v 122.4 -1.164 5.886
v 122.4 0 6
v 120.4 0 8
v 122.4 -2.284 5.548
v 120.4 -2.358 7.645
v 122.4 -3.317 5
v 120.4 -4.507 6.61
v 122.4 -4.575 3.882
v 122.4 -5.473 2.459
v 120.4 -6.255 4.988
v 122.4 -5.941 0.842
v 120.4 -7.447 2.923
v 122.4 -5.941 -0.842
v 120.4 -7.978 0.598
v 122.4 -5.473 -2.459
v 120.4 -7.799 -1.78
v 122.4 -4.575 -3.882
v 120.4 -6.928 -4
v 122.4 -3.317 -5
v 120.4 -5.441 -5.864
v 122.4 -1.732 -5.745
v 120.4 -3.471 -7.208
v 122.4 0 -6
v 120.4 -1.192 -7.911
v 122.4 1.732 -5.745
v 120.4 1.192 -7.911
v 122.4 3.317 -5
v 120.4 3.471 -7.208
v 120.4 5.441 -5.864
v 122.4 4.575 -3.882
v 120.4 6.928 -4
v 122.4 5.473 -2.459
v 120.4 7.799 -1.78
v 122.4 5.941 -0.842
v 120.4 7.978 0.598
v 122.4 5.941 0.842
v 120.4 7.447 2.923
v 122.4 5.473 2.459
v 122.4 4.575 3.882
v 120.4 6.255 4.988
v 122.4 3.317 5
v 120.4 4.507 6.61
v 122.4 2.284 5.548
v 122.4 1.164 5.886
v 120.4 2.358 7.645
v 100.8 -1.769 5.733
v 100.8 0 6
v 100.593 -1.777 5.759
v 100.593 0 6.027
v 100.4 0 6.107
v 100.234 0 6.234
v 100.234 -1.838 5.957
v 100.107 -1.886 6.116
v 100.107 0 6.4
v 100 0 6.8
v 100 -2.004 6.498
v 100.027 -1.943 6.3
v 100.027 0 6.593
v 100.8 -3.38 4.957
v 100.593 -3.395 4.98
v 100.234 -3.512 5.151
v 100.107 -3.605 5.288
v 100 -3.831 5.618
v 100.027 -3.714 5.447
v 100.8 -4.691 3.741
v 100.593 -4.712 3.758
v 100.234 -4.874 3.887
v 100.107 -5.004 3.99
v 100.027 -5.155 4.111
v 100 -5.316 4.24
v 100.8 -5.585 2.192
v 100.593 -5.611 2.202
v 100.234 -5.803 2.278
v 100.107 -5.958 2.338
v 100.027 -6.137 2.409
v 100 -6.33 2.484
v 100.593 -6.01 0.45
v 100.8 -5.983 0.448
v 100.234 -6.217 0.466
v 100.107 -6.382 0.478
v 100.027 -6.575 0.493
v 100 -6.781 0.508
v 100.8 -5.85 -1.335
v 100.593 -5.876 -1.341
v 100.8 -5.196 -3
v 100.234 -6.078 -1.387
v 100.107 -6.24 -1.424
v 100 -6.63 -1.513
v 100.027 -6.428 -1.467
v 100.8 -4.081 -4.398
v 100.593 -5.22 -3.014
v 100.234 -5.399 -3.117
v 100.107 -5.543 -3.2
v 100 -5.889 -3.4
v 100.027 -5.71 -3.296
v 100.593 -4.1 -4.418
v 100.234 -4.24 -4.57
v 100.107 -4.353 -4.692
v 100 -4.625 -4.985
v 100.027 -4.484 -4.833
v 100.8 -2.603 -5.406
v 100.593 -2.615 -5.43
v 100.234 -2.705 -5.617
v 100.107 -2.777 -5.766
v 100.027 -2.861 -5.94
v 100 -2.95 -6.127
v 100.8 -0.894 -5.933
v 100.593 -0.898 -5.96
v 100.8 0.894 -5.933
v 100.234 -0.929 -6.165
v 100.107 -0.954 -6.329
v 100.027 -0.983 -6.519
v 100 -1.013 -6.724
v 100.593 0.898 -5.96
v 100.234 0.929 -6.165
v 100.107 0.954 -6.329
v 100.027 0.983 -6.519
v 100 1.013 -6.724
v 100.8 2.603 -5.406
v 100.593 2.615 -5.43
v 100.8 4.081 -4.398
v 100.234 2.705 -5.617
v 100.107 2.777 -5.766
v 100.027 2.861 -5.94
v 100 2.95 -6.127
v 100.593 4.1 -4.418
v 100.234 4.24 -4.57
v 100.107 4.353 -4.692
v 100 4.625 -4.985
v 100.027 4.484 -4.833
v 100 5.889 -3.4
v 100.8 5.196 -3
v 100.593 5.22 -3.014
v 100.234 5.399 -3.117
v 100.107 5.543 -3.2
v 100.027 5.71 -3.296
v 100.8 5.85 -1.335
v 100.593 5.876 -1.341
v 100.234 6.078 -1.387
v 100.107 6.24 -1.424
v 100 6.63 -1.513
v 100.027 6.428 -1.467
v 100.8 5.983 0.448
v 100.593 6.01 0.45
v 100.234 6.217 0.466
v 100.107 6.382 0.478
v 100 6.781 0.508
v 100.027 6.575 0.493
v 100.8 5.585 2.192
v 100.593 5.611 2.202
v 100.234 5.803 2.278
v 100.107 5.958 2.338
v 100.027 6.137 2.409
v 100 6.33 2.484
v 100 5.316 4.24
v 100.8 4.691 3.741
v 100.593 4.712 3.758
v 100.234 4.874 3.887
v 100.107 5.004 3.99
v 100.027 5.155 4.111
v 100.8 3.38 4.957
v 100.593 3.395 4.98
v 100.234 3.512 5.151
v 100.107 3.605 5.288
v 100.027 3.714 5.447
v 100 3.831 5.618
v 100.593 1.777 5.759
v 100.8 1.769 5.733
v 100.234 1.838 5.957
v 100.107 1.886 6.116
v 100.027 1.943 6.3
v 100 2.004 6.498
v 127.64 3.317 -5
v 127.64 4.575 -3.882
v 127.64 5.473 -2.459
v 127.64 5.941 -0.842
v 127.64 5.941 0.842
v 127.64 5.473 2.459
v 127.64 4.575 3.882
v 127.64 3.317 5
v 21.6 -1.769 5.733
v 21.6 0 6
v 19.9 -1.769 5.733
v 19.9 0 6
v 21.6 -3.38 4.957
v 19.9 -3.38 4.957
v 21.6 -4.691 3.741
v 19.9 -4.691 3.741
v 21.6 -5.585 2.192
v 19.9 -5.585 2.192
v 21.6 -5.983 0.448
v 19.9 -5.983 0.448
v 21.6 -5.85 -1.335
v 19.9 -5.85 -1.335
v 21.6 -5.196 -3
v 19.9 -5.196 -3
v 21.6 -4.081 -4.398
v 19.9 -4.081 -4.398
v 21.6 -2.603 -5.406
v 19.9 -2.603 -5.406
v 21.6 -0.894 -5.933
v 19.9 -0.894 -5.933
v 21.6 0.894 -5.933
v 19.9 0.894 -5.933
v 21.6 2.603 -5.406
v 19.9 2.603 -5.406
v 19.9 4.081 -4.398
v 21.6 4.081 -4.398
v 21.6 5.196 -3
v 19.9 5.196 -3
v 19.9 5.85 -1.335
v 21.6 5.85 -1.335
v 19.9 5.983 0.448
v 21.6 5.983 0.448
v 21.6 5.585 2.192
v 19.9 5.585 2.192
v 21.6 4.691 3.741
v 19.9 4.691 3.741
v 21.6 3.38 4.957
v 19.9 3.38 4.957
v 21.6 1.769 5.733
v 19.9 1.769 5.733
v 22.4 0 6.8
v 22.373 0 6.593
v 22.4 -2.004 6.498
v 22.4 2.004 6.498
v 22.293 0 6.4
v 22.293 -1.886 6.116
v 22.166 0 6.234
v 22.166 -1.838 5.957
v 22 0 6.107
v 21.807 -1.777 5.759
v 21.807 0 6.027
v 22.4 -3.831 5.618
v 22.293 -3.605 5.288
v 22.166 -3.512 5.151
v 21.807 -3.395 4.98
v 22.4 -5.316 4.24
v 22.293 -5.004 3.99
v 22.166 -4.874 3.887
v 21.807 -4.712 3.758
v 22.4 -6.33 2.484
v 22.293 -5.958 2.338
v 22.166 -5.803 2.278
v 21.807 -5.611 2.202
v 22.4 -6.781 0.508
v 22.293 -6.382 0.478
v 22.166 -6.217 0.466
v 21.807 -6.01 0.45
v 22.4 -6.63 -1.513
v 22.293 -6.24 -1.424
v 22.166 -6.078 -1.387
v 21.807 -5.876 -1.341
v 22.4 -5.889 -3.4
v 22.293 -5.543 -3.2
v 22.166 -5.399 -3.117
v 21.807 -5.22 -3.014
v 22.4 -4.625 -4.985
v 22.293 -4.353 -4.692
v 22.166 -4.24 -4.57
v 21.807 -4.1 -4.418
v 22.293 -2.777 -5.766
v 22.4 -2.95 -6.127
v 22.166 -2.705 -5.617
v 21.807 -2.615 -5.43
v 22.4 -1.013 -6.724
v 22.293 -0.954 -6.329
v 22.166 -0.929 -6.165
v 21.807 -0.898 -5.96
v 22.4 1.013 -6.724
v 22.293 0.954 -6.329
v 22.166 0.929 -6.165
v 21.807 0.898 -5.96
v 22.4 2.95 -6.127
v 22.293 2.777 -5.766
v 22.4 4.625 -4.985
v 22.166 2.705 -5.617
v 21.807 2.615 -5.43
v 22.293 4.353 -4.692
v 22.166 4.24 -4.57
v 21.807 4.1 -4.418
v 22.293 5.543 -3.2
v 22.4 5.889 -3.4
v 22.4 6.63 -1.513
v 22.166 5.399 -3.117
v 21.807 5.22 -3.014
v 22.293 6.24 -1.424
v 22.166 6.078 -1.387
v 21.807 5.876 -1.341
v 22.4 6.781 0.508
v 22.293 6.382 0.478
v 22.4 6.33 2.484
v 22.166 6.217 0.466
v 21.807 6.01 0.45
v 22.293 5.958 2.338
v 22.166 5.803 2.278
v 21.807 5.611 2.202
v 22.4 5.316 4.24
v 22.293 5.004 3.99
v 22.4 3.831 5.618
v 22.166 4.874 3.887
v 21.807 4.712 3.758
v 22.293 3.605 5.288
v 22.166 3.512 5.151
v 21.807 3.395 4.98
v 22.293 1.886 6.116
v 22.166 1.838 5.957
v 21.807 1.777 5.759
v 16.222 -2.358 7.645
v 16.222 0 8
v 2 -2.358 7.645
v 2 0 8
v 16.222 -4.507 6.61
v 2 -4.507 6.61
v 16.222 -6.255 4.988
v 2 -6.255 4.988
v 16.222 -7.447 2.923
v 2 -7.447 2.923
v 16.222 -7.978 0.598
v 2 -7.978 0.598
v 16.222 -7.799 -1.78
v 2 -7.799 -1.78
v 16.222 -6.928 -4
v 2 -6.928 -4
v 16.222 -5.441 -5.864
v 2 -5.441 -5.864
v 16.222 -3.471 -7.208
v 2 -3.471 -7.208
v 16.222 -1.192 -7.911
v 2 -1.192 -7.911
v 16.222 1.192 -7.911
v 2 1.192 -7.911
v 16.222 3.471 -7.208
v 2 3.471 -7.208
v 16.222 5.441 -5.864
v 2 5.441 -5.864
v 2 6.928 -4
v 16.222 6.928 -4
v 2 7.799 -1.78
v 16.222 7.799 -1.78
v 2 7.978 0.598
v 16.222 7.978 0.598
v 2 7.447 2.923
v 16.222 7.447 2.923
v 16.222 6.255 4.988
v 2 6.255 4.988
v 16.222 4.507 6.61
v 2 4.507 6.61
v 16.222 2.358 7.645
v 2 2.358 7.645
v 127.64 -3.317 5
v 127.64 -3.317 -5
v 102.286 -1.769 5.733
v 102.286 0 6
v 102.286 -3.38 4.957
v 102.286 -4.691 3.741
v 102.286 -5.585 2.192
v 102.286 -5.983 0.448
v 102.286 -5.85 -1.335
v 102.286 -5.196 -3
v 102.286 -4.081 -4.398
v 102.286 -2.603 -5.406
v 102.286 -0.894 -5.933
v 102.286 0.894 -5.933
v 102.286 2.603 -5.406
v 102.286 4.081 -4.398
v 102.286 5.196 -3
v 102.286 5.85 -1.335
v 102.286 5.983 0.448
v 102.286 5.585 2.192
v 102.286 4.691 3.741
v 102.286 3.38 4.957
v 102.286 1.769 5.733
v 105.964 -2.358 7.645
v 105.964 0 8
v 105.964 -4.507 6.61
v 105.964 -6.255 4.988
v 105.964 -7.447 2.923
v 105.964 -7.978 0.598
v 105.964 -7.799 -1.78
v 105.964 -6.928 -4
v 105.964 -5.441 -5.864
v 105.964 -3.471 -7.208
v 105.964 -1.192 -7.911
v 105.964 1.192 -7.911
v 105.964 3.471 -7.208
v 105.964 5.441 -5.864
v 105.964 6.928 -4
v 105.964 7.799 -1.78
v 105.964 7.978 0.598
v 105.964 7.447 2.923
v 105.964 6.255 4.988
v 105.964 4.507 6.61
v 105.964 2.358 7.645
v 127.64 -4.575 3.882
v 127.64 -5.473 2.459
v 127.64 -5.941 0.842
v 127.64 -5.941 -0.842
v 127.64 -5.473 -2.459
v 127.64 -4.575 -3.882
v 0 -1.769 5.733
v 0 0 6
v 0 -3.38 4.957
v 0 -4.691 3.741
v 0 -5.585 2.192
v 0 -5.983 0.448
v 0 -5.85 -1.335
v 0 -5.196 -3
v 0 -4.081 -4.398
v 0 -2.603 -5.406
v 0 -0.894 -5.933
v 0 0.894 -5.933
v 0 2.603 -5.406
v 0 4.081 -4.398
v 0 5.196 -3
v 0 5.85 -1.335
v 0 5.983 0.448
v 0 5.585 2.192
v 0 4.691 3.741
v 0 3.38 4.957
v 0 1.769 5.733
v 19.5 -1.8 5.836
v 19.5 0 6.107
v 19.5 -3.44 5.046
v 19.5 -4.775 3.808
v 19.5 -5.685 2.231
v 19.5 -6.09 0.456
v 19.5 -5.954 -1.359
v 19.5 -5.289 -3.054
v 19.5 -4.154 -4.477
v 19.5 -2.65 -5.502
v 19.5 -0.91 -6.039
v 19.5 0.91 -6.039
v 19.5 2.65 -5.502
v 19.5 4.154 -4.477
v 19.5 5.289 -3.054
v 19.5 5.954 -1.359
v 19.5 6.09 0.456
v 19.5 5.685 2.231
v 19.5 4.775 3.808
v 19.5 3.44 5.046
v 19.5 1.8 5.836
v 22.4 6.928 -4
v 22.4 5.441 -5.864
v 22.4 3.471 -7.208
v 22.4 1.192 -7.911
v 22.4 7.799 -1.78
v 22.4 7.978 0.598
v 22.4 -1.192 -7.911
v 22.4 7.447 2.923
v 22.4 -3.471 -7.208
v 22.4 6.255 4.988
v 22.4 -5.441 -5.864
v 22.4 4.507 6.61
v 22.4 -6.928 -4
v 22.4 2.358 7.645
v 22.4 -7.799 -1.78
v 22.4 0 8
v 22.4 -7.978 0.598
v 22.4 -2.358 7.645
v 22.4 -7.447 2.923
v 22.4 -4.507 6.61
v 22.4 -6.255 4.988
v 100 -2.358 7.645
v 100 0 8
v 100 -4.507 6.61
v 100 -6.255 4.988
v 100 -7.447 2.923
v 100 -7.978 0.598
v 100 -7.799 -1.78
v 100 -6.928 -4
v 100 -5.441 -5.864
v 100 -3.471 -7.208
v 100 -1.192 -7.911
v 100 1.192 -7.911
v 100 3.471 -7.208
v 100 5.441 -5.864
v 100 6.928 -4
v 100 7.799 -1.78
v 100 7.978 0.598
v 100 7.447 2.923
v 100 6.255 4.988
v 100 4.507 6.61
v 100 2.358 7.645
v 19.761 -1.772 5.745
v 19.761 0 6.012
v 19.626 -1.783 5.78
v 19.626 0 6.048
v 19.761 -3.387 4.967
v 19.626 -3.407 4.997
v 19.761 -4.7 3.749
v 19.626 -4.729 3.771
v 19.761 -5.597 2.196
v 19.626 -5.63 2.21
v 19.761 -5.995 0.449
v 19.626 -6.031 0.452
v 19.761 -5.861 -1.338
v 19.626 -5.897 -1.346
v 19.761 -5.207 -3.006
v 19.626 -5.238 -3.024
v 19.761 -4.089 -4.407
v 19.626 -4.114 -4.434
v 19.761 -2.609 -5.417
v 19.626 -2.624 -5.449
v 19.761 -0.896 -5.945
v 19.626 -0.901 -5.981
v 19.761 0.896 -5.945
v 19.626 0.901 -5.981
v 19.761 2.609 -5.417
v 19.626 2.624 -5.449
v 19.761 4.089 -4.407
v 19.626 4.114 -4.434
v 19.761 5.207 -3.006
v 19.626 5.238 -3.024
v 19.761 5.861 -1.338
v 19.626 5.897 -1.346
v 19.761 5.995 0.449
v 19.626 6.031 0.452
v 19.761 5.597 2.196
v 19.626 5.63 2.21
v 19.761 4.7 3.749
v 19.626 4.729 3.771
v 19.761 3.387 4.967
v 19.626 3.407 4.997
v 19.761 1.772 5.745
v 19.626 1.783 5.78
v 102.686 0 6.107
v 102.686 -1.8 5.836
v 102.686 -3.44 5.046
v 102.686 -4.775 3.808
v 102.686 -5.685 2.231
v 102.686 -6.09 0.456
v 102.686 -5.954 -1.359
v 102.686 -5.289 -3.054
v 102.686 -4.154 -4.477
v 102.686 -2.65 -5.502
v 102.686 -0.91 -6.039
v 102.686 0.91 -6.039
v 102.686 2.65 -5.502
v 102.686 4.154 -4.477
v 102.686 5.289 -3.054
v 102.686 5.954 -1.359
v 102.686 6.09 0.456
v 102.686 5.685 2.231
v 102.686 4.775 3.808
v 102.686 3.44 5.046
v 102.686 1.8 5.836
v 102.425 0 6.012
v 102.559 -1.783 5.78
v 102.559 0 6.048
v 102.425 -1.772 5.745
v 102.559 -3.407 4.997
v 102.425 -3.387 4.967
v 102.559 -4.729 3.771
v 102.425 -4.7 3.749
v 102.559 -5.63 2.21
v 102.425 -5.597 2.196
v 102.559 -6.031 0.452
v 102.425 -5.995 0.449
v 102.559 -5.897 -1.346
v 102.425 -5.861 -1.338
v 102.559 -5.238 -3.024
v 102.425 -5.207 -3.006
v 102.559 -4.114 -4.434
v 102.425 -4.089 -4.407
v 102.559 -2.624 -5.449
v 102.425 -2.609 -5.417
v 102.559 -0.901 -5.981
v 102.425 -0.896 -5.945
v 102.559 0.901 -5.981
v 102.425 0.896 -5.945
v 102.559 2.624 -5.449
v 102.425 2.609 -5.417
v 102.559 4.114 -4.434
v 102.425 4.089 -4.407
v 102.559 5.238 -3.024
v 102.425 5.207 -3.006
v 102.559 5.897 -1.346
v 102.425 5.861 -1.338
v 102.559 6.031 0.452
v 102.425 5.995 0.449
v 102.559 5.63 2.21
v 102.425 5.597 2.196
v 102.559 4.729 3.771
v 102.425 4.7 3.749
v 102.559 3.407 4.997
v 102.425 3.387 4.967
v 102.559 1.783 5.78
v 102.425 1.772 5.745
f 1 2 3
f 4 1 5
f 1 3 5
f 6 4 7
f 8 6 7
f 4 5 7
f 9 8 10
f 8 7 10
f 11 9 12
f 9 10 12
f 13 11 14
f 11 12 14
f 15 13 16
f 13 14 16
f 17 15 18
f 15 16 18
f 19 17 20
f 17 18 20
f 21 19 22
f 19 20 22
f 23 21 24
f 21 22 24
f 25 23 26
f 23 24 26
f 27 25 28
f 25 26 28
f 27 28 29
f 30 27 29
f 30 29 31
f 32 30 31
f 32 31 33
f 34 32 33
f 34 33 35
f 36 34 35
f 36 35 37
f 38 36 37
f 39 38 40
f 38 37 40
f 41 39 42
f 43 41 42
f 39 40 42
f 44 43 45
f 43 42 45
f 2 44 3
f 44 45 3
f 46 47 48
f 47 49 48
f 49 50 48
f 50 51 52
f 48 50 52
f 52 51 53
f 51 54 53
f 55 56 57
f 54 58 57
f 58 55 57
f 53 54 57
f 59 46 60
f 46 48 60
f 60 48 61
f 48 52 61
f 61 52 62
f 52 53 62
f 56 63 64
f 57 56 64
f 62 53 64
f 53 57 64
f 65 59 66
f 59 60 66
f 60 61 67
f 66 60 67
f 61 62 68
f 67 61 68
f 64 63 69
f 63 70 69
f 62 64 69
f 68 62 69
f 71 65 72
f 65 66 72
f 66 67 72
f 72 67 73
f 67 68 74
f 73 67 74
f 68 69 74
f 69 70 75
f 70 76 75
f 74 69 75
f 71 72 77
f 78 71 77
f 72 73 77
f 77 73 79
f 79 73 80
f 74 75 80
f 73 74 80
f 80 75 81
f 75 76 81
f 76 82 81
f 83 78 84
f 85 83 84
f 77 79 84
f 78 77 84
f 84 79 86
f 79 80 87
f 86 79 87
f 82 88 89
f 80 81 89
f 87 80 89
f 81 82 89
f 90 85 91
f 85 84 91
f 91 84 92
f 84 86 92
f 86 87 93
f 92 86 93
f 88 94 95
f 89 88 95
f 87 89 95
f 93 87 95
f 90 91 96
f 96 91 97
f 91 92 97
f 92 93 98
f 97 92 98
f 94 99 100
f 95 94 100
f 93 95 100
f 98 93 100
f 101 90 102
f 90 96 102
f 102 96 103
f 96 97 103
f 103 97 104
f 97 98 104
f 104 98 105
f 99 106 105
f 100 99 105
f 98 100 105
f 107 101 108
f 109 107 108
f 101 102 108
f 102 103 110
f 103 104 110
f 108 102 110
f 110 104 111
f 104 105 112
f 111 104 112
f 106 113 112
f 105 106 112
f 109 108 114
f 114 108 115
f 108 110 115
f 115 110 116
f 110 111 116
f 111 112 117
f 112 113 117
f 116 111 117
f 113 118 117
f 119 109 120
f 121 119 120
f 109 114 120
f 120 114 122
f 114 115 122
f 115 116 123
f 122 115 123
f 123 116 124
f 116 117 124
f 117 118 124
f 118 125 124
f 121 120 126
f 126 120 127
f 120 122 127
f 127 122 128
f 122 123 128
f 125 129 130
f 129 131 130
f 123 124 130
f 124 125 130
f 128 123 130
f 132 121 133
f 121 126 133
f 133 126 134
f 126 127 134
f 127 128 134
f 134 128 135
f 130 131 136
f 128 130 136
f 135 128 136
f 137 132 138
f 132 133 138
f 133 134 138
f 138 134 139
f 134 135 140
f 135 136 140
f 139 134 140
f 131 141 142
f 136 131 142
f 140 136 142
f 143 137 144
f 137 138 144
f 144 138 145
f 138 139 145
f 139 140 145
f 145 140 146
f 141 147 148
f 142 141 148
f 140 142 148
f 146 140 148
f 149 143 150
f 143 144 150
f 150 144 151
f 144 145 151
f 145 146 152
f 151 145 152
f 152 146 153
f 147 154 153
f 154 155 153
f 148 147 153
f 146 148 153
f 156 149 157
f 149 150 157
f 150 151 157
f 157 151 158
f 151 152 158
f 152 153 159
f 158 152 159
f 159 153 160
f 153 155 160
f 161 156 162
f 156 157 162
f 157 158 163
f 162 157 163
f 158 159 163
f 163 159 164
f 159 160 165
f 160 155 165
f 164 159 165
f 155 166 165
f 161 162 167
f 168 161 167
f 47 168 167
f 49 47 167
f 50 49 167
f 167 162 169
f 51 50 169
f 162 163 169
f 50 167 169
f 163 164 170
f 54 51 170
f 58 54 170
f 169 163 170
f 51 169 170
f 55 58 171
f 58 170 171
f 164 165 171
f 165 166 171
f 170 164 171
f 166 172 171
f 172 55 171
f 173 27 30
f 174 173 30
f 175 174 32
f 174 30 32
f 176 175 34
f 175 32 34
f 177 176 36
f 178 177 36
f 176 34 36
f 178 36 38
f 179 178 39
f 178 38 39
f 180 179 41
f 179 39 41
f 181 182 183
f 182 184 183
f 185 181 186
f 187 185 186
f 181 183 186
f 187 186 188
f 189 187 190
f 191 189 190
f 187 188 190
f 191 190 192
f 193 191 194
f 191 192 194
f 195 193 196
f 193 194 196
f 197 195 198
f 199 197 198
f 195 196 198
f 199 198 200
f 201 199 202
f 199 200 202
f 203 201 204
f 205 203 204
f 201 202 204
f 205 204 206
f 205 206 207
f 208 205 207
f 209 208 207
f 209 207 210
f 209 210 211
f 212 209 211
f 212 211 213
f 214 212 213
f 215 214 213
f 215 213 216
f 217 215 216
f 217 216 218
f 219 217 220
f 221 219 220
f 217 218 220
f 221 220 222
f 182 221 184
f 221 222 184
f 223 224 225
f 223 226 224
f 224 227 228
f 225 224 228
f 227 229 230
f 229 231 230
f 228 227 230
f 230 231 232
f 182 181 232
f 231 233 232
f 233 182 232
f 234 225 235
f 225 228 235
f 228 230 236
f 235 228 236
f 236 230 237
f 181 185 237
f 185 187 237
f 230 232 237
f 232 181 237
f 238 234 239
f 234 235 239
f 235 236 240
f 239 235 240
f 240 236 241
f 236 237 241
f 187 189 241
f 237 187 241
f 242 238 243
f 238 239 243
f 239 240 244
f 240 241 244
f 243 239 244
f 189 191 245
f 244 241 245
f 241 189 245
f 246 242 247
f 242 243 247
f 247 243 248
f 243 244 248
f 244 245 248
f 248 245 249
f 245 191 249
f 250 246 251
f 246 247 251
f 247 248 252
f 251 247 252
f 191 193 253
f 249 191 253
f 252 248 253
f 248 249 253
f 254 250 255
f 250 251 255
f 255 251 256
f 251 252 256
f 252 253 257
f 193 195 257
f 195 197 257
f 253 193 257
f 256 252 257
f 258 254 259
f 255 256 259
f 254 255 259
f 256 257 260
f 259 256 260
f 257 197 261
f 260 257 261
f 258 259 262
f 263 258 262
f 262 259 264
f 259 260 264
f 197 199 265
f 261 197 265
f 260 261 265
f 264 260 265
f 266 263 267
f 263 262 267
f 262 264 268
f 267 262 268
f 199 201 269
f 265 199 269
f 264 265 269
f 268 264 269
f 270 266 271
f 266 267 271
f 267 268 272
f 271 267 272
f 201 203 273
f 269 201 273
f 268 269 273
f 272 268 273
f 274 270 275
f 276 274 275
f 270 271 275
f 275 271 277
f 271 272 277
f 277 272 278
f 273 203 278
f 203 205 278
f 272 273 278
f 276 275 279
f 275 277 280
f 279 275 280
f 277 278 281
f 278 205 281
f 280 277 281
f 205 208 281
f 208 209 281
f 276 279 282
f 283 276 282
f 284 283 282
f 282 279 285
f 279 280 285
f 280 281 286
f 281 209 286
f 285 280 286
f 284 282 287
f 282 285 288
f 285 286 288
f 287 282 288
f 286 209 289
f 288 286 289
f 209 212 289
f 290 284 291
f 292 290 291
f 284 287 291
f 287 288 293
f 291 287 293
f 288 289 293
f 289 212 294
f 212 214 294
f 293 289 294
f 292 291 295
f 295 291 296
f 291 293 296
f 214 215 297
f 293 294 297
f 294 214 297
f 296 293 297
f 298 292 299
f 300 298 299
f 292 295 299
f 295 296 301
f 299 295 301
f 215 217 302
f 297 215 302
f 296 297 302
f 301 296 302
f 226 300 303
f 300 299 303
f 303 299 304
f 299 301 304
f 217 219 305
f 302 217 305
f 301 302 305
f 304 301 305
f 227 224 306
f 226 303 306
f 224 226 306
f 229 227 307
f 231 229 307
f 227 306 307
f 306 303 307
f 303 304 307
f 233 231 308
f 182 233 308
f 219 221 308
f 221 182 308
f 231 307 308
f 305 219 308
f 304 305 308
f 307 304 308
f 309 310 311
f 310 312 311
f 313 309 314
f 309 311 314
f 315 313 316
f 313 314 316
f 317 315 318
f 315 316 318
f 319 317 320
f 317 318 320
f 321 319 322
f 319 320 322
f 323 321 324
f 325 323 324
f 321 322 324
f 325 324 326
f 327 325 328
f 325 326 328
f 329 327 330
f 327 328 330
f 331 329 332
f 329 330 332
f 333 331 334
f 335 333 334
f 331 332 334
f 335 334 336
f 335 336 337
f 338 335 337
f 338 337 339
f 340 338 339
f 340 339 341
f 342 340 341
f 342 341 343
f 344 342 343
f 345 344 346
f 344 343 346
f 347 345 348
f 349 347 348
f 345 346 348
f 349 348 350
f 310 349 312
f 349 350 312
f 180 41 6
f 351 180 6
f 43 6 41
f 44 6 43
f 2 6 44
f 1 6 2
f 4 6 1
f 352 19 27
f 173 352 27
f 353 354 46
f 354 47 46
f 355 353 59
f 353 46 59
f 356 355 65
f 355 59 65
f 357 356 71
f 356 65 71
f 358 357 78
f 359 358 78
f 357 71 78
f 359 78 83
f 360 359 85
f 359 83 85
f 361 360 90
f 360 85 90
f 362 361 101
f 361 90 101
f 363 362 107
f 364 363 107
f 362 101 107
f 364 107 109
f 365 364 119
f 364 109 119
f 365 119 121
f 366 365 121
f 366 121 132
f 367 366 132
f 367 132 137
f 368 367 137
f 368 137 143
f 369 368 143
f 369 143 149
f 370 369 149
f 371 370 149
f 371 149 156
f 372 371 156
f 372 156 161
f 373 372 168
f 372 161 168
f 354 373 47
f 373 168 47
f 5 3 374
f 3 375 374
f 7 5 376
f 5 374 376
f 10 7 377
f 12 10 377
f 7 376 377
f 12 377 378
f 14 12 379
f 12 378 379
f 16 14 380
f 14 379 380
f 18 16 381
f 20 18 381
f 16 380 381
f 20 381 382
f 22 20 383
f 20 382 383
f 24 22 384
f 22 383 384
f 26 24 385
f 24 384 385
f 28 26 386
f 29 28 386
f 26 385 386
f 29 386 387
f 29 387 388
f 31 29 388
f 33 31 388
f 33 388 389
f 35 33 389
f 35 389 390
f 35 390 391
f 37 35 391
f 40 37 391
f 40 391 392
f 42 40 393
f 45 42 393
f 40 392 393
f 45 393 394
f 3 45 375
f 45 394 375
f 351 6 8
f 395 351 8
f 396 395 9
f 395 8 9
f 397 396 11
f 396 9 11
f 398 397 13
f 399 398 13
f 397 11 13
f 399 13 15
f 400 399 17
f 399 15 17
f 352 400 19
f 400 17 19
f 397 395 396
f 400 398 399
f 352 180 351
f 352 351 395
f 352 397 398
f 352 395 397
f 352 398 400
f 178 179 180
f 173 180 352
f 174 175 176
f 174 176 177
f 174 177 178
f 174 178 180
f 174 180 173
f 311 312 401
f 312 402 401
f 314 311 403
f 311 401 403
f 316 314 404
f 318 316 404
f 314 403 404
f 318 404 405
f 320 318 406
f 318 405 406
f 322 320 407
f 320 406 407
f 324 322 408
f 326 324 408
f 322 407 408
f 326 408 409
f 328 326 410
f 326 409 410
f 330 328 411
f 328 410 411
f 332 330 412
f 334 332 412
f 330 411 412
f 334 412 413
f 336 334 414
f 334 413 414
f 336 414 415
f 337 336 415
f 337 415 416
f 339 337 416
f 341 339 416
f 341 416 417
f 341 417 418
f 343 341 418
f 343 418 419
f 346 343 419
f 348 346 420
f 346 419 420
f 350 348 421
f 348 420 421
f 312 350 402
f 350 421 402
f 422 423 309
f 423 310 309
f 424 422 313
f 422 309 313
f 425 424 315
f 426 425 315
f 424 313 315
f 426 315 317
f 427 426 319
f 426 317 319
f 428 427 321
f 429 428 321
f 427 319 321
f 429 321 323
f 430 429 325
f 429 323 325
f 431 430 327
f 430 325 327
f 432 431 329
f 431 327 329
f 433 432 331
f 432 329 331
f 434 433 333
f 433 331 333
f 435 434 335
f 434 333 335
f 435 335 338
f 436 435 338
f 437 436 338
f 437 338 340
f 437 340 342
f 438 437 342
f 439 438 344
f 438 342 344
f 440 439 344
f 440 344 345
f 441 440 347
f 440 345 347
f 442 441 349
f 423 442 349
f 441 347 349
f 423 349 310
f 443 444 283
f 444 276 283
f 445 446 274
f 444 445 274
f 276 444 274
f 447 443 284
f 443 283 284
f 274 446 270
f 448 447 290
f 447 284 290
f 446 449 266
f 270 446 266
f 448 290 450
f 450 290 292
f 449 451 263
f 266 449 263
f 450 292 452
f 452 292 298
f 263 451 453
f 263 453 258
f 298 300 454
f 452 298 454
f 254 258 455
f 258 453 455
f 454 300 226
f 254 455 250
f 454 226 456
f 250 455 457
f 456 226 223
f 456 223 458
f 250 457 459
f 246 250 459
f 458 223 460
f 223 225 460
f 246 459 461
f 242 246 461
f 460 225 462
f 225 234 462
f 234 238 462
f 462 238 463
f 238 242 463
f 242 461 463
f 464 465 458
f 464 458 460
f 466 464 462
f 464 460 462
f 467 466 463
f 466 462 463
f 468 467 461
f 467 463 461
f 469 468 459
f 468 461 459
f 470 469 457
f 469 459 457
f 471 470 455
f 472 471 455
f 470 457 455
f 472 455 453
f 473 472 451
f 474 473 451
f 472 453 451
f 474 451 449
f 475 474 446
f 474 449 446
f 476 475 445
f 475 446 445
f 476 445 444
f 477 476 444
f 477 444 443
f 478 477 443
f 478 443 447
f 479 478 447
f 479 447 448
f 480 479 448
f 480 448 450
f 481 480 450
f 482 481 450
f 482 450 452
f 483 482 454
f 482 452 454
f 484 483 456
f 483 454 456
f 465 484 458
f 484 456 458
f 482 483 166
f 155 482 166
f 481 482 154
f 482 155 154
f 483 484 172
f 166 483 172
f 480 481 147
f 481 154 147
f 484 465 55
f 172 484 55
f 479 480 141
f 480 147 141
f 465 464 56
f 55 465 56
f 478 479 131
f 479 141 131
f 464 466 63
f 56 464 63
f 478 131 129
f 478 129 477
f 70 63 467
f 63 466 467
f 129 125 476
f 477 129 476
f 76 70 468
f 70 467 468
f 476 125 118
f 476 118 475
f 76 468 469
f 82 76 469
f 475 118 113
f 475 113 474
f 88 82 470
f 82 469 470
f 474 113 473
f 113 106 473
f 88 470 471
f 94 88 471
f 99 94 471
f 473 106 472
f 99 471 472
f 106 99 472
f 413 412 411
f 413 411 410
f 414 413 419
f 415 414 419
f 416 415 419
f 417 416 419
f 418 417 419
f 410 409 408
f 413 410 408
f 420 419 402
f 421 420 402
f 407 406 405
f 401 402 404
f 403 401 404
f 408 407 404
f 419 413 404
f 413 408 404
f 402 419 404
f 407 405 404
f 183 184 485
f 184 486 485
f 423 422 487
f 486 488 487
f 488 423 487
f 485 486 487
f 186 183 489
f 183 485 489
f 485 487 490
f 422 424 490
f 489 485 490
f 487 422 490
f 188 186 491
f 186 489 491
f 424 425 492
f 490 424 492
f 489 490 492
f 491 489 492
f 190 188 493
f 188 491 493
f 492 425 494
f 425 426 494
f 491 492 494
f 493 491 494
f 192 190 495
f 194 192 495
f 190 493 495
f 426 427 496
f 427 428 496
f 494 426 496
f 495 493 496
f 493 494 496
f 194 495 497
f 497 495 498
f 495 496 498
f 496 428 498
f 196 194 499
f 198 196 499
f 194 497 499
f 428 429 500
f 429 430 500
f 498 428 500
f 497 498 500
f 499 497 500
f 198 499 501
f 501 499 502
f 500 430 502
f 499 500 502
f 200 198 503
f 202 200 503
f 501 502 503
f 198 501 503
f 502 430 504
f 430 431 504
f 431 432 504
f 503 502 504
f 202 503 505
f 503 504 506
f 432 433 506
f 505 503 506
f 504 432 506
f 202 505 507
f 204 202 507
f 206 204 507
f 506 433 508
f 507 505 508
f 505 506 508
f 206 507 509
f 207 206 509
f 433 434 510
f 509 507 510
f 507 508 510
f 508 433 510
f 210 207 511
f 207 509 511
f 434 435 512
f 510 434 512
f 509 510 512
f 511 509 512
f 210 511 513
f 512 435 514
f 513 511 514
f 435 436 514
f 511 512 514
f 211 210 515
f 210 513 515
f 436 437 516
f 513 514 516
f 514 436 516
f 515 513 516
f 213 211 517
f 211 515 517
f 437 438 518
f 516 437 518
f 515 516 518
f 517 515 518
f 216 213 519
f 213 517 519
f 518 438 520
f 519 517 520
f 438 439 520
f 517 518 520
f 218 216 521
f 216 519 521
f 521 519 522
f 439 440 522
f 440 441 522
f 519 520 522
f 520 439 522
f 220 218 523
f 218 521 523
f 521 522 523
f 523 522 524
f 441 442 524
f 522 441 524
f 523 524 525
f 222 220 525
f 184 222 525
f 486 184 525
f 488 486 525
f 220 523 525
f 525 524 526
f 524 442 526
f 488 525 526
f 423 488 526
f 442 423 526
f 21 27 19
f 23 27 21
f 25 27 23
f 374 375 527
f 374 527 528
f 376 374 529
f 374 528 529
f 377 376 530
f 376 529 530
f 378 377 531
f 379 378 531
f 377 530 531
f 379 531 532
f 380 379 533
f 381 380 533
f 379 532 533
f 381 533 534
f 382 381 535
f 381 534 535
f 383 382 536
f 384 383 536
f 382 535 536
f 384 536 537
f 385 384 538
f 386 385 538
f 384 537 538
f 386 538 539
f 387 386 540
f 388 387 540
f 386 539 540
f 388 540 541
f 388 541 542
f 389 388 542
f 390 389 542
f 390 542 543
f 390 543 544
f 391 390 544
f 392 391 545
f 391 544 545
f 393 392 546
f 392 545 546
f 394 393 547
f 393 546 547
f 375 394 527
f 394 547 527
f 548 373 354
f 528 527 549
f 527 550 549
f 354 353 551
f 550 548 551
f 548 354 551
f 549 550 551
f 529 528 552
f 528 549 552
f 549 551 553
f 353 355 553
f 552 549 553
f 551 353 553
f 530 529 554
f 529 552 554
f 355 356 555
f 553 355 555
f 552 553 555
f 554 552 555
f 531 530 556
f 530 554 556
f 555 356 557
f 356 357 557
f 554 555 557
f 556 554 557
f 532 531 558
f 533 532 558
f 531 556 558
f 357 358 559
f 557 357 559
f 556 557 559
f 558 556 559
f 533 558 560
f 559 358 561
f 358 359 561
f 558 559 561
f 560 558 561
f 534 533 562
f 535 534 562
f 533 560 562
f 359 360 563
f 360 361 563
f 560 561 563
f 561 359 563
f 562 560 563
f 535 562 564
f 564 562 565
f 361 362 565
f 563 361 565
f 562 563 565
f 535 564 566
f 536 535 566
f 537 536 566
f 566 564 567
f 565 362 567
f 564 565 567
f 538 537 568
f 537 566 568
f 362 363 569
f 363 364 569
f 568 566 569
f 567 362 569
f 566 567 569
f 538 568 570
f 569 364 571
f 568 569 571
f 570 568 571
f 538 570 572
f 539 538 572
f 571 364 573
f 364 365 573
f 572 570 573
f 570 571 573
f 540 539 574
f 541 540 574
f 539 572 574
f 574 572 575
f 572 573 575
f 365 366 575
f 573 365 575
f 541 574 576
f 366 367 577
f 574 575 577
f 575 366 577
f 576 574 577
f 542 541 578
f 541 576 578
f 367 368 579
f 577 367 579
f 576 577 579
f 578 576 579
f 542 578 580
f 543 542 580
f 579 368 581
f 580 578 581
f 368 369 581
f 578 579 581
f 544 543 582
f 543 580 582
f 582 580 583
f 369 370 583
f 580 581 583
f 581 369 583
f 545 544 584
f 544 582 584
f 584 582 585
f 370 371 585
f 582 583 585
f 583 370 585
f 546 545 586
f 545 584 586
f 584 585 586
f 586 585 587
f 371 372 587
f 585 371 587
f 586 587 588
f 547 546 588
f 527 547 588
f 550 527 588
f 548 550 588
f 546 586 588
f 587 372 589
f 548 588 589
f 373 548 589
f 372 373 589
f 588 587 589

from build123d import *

# Parameters (mm, degrees)
DOGPOINT_DEPTH = 5.24


with BuildPart() as part:
    # BodySke → BaseBody (revolve)
    with BuildSketch(Plane.XY, mode=Mode.PRIVATE) as basebody_sk:
        with BuildLine():
            Line((19.5, 6.107179677), (16.221539031, 8))
            Line((16.221539031, 8), (2, 8))
            Line((2, 8), (0, 6))
            Line((0, 6), (0, 0))
            Line((0, 0), (122.4, 0))
            Line((122.4, 0), (122.4, 6))
            Line((122.4, 6), (120.4, 8))
            Line((120.4, 8), (105.964101615, 8))
            Line((105.964101615, 8), (102.685640646, 6.107179677))
            ThreePointArc((102.685640646, 6.107179677), (102.492695882, 6.027259339), (102.285640646, 6))
            Line((102.285640646, 6), (100.8, 6))
            ThreePointArc((100.8, 6), (100.234314575, 6.234314575), (100, 6.8))
            Line((100, 6.8), (100, 8))
            Line((100, 8), (22.4, 8))
            Line((22.4, 8), (22.4, 6.8))
            ThreePointArc((22.4, 6.8), (22.165685425, 6.234314575), (21.6, 6))
            Line((21.6, 6), (19.9, 6))
            ThreePointArc((19.9, 6), (19.692944764, 6.027259339), (19.5, 6.107179677))
        make_face()
    revolve(basebody_sk.sketch.rotate(Axis((-3.175, 0, 0), (1, 0, 0)), 90), axis=Axis((-3.175, 0, 0), (1, 0, 0)))

    # DogPointSke → DogPoint (add)
    with BuildSketch(Plane(origin=(122.4, 0, 0), x_dir=(0, 0, -1), z_dir=(1, 0, 0))):
        with BuildLine():
            Line((-5, 3.31662479), (-5, -3.31662479))
            ThreePointArc((-5, -3.31662479), (0, -6), (5, -3.31662479))
            Line((5, -3.31662479), (5, 3.31662479))
            ThreePointArc((5, 3.31662479), (0, 6), (-5, 3.31662479))
        make_face()
    extrude(amount=DOGPOINT_DEPTH)


solid = part.part
